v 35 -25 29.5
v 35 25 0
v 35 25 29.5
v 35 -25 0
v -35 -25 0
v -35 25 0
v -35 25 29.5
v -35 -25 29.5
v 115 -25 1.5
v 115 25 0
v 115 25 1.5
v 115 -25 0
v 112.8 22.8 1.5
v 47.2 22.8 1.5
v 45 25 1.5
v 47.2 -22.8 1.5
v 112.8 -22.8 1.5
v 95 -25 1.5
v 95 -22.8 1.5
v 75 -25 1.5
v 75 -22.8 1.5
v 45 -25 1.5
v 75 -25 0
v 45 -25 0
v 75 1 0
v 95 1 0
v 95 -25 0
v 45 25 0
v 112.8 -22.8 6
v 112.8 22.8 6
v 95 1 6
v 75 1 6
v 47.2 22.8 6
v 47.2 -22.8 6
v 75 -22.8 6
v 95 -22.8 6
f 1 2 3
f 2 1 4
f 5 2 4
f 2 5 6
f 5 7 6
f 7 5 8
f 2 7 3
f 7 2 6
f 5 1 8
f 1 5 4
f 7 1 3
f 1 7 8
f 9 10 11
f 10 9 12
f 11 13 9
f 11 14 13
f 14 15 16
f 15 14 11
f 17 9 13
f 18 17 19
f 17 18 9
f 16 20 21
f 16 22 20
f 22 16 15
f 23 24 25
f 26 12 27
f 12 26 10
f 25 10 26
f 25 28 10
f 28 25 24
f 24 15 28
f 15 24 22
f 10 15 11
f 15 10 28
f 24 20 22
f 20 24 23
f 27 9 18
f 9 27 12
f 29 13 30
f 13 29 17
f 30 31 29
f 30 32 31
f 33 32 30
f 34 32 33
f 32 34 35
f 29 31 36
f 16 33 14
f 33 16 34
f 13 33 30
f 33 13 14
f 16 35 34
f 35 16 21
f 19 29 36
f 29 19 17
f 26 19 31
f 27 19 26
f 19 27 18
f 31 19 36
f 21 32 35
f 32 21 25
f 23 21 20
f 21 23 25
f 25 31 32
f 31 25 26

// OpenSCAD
// Two-part enclosure for a small electronics board (e.g. Arduino-based temperature logger)
// Print orientation: both parts rest on the bed (z = 0), side by side, with a 10 mm gap.
// Units: mm. Wall thicknesses are 2 mm (box) and 1.5 mm (lip).

// ---------------- Parameters ----------------
box_x      = 70;    // box outer length (X)
box_y      = 50;    // box outer width (Y)
box_z      = 30;    // box outer height (Z)
wall       = 2;     // box wall thickness
floor      = 2;     // box floor thickness

lip_t      = 1.5;   // lip wall thickness
lip_h      = 4;     // lip height (from plate top)
lip_x      = 65.6;  // lip outer length (X)
lip_y      = 45.6;  // lip outer width (Y)
clearance  = 0.2;   // clearance between lip and box opening on each side

eps        = 0.5;   // cutter overshoot past faces
$fn        = 64;

// Derived: plate thickness under the lip
plate_t    = lip_t; // 1.5 mm (plate and lip are one solid, printed upside down)

// ---------------- Modules ----------------
module box() {
    // Open-top box: walls + floor, no top face
    difference() {
        translate([-box_x/2, -box_y/2, 0])
            cube([box_x, box_y, box_z]);
        // Cut out the open top (through the top face)
        translate([-box_x/2, -box_y/2, box_z - eps])
            cube([box_x, box_y, eps + 1]);
    }
}

module lid() {
    // Plate with centred rectangular lip. Printed upside down:
    // the lip is the top face of the solid, so it slides into the box opening.
    union() {
        // Base plate
        translate([-box_x/2, -box_y/2, 0])
            cube([box_x, box_y, plate_t]);
        // Lip (overlaps the plate by lip_t, so they fuse into one solid)
        translate([-lip_x/2, -lip_y/2, plate_t])
            cube([lip_x, lip_y, lip_h + eps]);
    }
}

// ---------------- Assembly ----------------
// Print the two parts side by side on the bed, 10 mm apart
difference() {
    union() {
        box();
        translate([box_x + 10, 0, 0])
            lid();
    }
    // A small invisible cutter removes the 10 mm gap region from the union,
    // so the two parts remain distinct solids in one file.
    translate([box_x + 5, -box_y - 1, 0])
        cube([20, box_y + 2, box_z + 1]);
}
